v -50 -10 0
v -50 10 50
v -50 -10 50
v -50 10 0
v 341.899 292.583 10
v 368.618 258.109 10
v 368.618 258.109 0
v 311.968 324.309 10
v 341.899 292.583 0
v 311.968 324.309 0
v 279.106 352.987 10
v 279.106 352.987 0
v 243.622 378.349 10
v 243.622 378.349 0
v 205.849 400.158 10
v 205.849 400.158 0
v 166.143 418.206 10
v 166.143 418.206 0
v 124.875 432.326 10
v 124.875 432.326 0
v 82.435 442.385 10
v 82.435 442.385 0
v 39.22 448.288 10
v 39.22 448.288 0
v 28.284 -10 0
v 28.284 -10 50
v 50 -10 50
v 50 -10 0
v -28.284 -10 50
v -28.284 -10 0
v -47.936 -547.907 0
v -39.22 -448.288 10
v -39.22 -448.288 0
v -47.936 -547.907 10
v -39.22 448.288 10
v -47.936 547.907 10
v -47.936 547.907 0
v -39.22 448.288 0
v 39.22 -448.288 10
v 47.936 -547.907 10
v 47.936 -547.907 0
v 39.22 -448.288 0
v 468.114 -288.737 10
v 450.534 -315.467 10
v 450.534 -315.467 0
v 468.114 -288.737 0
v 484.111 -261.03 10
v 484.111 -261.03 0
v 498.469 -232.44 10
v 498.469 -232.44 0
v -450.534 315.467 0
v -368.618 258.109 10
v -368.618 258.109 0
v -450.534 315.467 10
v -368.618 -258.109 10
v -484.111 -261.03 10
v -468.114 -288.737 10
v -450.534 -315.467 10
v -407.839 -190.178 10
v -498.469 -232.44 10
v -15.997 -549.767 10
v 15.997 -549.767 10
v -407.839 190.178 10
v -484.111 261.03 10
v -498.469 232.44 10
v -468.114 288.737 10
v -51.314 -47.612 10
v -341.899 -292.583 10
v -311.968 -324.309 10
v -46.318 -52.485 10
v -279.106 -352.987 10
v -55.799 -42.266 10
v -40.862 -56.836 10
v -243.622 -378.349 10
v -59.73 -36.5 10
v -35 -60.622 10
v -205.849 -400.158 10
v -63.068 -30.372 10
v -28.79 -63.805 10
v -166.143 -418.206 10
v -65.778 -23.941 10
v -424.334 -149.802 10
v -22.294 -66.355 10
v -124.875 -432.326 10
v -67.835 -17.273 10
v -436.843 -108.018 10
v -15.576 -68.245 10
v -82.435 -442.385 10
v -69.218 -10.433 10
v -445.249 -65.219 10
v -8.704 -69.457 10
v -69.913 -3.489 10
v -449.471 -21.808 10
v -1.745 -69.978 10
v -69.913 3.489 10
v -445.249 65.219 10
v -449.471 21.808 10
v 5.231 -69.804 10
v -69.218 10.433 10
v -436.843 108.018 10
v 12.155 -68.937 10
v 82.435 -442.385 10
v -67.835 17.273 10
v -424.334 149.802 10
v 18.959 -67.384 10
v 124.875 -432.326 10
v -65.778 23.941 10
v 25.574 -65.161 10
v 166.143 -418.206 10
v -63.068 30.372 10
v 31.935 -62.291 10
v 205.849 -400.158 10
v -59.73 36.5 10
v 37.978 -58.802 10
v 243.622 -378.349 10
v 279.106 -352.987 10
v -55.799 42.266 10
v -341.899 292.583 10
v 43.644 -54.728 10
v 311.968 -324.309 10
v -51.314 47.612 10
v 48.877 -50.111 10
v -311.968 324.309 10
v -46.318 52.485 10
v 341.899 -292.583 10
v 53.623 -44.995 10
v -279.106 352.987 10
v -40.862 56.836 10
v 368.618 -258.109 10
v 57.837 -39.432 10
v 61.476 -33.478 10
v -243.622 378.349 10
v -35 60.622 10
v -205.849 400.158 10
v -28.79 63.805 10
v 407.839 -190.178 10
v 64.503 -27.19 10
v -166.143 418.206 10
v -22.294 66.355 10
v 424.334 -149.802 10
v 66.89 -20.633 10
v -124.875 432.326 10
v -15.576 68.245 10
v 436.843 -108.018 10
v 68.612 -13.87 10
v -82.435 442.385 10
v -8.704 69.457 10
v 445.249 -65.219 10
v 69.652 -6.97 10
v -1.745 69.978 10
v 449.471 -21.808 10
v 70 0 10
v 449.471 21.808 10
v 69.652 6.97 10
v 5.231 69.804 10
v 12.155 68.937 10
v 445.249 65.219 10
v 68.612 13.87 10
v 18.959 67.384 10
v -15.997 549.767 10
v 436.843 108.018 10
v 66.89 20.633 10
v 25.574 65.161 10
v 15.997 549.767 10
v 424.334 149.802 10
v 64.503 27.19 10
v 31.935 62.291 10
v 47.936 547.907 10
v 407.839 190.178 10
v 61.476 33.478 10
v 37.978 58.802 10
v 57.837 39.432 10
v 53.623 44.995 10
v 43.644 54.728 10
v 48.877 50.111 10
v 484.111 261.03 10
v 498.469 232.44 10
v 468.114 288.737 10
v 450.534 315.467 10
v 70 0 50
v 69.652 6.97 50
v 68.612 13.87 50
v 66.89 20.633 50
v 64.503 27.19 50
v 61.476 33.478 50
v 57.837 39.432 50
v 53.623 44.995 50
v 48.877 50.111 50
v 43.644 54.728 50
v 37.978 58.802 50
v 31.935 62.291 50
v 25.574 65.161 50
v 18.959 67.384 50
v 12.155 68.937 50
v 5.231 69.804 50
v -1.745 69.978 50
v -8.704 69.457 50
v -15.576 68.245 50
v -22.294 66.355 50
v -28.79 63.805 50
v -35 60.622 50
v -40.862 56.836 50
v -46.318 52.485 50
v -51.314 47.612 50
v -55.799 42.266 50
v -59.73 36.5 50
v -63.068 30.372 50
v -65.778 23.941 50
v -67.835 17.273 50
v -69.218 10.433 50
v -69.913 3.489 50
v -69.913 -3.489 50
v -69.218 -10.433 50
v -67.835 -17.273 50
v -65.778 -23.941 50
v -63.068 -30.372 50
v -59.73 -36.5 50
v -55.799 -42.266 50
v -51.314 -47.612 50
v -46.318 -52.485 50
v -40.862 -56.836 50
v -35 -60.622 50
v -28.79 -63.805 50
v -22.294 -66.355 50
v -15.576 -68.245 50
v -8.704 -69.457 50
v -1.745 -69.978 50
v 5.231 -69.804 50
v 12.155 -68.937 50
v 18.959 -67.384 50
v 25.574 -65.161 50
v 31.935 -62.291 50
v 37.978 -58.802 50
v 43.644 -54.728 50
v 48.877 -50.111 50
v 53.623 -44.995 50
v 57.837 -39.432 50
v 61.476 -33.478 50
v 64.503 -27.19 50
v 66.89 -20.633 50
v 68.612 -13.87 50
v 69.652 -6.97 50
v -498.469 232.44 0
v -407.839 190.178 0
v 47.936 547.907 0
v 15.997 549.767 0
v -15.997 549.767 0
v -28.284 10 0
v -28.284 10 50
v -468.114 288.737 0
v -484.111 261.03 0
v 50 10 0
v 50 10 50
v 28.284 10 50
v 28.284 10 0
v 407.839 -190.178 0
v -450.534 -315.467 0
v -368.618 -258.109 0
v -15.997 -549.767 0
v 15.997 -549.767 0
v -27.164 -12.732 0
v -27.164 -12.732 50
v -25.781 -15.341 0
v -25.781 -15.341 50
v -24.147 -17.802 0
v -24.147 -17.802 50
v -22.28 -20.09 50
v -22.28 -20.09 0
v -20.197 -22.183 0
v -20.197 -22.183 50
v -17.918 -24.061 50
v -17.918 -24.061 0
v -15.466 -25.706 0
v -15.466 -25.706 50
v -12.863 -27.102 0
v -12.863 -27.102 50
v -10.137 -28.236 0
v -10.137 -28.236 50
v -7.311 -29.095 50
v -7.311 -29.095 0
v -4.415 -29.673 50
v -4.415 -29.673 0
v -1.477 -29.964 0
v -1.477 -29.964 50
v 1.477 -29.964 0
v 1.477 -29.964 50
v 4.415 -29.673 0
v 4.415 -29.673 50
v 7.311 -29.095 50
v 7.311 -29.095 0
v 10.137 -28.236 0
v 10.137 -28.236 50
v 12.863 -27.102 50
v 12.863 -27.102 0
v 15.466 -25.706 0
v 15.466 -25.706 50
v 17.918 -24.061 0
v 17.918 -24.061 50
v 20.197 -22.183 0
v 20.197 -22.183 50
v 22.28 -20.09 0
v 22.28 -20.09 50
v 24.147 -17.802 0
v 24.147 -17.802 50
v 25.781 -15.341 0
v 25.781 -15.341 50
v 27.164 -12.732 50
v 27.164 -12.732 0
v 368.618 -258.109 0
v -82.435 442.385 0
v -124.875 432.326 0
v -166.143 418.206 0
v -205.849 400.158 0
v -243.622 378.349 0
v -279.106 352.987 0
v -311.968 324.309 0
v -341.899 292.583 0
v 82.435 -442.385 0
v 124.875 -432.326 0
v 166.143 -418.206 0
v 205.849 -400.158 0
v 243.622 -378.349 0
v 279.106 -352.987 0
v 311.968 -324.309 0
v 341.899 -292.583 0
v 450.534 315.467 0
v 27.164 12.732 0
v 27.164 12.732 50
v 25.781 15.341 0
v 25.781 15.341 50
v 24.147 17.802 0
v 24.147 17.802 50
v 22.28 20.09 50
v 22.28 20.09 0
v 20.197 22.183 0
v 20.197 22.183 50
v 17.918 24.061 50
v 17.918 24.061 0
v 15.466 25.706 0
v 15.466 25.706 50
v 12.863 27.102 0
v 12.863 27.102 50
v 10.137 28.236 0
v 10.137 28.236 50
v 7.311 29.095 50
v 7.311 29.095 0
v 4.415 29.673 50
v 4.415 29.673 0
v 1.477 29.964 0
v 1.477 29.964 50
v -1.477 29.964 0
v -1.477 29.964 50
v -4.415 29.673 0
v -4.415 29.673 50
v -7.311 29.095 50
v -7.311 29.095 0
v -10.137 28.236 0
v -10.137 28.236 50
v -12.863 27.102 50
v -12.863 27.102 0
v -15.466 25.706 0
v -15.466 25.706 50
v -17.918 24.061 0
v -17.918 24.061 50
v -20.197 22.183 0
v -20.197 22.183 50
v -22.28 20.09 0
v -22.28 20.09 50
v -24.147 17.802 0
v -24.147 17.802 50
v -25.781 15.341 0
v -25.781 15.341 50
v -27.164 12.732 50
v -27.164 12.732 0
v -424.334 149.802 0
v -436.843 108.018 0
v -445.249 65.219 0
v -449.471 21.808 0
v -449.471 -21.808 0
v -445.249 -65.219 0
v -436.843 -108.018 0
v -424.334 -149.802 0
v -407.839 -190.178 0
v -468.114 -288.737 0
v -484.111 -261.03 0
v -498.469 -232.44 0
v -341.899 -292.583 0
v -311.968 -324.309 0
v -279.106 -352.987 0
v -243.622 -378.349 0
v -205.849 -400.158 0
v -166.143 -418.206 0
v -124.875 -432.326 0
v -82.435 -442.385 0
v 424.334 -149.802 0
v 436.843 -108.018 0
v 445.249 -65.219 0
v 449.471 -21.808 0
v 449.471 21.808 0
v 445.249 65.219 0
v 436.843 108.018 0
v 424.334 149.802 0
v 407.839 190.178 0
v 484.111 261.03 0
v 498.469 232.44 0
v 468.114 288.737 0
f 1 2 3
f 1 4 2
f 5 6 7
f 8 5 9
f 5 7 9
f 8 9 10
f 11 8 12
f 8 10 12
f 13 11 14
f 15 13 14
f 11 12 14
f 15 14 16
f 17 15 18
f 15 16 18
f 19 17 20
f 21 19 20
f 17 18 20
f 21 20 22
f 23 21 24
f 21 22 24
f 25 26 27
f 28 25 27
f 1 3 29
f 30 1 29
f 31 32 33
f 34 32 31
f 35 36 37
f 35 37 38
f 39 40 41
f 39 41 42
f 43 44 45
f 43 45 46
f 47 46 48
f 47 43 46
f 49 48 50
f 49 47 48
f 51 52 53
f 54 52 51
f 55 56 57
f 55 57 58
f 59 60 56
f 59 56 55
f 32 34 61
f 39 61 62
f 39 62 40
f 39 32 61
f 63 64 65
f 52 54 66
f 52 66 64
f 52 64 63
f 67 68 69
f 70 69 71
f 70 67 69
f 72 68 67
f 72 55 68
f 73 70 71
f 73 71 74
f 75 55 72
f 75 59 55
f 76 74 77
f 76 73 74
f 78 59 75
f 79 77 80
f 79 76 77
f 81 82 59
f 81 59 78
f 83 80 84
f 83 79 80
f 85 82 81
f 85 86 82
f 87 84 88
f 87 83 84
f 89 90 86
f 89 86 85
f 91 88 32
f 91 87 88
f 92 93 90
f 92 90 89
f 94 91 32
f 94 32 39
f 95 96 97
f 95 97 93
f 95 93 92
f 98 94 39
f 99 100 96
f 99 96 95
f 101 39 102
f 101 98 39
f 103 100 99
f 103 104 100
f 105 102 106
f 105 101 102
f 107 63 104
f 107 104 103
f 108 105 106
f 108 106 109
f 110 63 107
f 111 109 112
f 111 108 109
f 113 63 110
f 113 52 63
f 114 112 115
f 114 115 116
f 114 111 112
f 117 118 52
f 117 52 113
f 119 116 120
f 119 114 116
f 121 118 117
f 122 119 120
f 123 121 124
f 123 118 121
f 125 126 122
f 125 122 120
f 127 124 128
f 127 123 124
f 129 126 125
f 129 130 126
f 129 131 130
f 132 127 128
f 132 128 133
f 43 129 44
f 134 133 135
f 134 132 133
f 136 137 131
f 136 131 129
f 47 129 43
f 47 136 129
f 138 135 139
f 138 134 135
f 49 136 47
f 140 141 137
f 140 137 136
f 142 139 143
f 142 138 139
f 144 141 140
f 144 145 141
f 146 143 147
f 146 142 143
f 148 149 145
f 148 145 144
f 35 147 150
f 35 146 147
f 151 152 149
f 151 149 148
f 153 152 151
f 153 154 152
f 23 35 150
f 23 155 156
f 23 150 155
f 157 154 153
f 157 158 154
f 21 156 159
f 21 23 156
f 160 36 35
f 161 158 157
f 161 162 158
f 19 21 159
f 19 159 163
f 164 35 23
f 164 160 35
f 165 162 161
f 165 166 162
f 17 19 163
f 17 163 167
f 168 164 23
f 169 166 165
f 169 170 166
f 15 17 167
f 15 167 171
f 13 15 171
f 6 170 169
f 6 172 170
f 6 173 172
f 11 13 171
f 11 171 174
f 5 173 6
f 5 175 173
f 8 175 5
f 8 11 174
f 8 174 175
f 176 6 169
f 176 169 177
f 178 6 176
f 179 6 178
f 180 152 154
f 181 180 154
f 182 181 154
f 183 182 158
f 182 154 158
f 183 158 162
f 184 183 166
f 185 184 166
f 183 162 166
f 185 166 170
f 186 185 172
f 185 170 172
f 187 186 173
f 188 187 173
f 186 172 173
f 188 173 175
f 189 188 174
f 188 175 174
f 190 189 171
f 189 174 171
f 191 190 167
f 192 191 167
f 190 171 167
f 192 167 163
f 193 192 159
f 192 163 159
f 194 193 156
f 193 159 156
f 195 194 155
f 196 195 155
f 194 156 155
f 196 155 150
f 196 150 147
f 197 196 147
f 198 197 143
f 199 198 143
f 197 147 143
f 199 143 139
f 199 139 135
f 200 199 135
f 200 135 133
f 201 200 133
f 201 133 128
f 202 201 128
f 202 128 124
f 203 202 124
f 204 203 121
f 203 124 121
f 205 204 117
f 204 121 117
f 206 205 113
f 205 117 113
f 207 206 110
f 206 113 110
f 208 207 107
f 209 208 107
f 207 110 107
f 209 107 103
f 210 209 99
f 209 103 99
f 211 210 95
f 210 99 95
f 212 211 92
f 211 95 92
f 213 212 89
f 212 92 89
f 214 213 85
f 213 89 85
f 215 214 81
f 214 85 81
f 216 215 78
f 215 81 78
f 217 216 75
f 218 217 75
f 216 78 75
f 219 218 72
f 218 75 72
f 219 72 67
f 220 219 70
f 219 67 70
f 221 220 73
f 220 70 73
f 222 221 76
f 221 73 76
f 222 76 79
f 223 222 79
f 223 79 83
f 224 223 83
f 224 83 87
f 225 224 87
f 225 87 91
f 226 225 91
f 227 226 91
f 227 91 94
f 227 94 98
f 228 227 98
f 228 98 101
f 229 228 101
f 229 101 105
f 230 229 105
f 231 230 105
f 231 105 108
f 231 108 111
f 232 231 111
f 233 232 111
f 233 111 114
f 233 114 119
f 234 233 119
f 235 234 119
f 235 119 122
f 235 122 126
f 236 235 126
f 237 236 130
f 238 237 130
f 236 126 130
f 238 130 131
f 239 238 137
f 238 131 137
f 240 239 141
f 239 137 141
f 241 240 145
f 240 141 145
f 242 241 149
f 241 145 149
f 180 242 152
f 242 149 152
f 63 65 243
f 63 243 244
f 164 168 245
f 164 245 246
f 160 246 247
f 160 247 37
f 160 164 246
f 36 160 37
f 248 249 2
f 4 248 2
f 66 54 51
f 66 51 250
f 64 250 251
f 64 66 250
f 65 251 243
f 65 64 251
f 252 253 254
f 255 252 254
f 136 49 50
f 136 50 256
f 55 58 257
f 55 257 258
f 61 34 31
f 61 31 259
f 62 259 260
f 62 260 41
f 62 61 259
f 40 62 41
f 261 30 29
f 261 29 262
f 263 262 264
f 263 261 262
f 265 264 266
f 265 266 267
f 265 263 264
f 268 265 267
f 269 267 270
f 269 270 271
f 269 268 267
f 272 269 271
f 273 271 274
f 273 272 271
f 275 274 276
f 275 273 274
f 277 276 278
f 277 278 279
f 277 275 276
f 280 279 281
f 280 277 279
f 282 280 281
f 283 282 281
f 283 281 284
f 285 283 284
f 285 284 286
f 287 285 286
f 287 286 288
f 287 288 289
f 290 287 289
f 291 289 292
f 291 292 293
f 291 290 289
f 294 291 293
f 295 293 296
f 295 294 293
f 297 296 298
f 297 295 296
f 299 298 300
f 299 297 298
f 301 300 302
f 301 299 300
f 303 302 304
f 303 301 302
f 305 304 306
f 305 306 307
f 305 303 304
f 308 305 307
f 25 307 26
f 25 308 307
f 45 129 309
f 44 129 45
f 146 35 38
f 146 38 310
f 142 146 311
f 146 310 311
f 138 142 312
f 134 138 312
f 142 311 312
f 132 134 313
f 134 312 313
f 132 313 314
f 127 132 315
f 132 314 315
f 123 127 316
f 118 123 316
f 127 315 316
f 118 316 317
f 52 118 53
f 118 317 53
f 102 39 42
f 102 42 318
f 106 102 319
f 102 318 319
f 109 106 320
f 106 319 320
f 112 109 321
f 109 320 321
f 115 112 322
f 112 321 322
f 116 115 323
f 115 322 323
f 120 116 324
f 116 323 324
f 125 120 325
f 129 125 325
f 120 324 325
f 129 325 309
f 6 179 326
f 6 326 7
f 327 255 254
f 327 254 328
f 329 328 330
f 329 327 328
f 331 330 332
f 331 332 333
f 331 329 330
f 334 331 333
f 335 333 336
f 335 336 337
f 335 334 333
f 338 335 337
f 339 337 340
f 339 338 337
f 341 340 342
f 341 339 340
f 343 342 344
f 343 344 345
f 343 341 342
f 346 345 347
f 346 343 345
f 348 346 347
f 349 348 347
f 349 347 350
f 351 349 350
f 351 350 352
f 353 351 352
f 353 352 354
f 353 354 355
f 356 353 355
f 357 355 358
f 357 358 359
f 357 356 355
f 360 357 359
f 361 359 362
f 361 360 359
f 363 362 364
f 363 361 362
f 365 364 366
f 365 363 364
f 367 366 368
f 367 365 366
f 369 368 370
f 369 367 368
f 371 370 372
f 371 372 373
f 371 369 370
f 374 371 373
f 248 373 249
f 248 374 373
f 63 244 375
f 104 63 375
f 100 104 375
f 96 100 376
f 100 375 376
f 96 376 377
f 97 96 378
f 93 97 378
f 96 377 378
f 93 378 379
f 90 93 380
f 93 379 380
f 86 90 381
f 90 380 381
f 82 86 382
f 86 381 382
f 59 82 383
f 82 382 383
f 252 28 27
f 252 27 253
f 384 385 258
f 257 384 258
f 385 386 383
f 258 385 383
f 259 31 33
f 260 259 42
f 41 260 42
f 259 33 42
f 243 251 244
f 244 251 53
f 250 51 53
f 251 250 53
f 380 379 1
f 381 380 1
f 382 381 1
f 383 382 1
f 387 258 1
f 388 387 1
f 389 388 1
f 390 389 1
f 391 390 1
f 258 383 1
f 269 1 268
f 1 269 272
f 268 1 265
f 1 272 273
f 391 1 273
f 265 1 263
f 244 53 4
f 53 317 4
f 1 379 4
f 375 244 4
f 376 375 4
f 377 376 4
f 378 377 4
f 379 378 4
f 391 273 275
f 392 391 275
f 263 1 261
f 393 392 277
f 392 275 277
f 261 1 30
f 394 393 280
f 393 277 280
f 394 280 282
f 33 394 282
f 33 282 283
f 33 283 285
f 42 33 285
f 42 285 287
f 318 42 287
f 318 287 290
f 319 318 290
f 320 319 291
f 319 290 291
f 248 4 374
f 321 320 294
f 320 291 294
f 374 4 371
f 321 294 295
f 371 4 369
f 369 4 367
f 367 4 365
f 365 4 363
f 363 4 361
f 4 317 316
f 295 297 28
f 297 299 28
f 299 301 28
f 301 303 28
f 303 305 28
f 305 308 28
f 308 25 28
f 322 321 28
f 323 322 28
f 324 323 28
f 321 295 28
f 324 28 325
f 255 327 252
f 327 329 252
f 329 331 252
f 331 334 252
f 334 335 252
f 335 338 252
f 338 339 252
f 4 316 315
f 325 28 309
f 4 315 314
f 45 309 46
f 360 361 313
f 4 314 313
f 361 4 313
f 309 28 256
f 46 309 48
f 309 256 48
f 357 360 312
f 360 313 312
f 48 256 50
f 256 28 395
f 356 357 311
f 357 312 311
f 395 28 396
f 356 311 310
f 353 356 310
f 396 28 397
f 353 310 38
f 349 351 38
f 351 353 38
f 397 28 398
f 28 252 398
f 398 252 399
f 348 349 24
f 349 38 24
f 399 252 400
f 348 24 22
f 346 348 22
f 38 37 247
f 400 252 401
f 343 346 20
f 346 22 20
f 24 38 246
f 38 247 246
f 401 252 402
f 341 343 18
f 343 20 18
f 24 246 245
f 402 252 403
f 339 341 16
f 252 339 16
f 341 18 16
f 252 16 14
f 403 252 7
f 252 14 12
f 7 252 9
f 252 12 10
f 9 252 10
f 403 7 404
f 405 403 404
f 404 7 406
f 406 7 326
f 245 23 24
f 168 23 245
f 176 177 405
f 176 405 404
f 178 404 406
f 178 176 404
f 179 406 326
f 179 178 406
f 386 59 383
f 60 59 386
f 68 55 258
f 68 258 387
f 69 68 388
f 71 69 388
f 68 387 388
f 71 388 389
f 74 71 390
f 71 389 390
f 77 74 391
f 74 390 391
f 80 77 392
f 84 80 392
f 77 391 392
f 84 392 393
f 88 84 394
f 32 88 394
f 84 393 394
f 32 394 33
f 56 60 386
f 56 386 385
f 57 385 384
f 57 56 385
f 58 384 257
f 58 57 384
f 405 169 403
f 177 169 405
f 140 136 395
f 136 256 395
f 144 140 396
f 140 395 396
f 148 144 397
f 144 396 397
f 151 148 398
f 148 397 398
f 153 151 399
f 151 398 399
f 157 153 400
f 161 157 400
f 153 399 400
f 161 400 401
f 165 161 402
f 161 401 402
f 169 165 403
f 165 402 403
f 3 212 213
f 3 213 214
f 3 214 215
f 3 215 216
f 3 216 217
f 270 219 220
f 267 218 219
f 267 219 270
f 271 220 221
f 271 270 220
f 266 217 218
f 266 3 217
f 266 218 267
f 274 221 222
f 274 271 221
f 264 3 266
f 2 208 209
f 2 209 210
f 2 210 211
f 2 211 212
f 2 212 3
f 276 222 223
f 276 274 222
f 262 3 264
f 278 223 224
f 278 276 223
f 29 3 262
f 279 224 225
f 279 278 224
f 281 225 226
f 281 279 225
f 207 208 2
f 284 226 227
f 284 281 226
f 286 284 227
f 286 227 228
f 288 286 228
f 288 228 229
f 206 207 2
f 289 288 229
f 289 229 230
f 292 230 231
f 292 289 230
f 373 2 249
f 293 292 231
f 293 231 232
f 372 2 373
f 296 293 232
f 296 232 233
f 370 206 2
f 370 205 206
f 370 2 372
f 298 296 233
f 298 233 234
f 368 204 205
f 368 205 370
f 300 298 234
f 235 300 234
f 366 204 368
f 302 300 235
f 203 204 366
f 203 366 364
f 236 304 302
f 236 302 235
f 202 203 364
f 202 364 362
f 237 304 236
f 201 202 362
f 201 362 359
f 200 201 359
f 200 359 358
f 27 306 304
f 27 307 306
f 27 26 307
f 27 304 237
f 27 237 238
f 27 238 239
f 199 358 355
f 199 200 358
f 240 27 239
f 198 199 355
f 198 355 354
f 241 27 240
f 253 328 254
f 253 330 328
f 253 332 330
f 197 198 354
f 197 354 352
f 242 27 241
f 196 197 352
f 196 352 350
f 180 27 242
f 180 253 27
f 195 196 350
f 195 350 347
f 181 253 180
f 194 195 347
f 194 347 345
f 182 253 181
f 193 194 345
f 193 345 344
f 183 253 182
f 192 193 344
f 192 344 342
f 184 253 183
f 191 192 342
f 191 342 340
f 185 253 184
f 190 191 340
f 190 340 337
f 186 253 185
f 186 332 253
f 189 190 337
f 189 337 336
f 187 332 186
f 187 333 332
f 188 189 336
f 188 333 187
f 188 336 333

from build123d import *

# Parameters (mm, degrees)
SKETCH1_R           = 450
BOSS_EXTRUDE1_DEPTH = 10
SKETCH2_R           = 70
BOSS_EXTRUDE2_DEPTH = 40
BOSS_EXTRUDE3_DEPTH = 10


with BuildPart() as part:
    # Sketch1 → Boss-Extrude1 (new body)
    with BuildSketch(Plane.XY):
        Circle(SKETCH1_R)
        with BuildLine():
            Line((28.284271247, -10), (50, -10))
            Line((50, -10), (50, 10))
            Line((50, 10), (28.284271247, 10))
            ThreePointArc((28.284271247, 10), (0, 30), (-28.284271247, 10))
            Line((-28.284271247, 10), (-50, 10))
            Line((-50, 10), (-50, -10))
            Line((-50, -10), (-28.284271247, -10))
            ThreePointArc((-28.284271247, -10), (0, -30), (28.284271247, -10))
        make_face(mode=Mode.SUBTRACT)
    extrude(amount=BOSS_EXTRUDE1_DEPTH)

    # Sketch2 → Boss-Extrude2 (add)
    with BuildSketch(Plane.XY.offset(10)):
        Circle(SKETCH2_R)
        with BuildLine():
            Line((-50, 10), (-50, -10))
            Line((-50, -10), (-28.284271247, -10))
            ThreePointArc((-28.284271247, -10), (0, -30), (28.284271247, -10))
            Line((28.284271247, -10), (50, -10))
            Line((50, -10), (50, 10))
            Line((50, 10), (28.284271247, 10))
            ThreePointArc((28.284271247, 10), (0, 30), (-28.284271247, 10))
            Line((-28.284271247, 10), (-50, 10))
        make_face(mode=Mode.SUBTRACT)
    extrude(amount=BOSS_EXTRUDE2_DEPTH)

    # Sketch3 → Boss-Extrude3 (add)
    with BuildSketch(Plane.XY.offset(10)):
        with BuildLine():
            Line((-47.935658511, 547.90708395), (-34.862297099, 398.477879237))
            ThreePointArc((-34.862297099, 398.477879237), (-17.447754946, 399.619288633), (0, 400))
            ThreePointArc((0, 400), (17.447754946, 399.619288633), (34.862297099, 398.477879237))
            Line((34.862297099, 398.477879237), (47.935658511, 547.90708395))
            ThreePointArc((47.935658511, 547.90708395), (0, 550), (-47.935658511, 547.90708395))
        make_face()
        with BuildLine():
            Line((450.533624359, 315.467039993), (327.660817716, 229.43057454))
            ThreePointArc((327.660817716, 229.43057454), (346.410161514, 200), (362.523114815, 169.047304696))
            Line((362.523114815, 169.047304696), (498.46928287, 232.440043957))
            ThreePointArc((498.46928287, 232.440043957), (476.313972081, 275), (450.533624359, 315.467039993))
        make_face()
        with BuildLine():
            Line((498.46928287, -232.440043957), (362.523114815, -169.047304696))
            ThreePointArc((362.523114815, -169.047304696), (346.410161514, -200), (327.660817716, -229.43057454))
            Line((327.660817716, -229.43057454), (450.533624359, -315.467039993))
            ThreePointArc((450.533624359, -315.467039993), (476.313972081, -275), (498.46928287, -232.440043957))
        make_face()
        with BuildLine():
            Line((47.935658511, -547.90708395), (34.862297099, -398.477879237))
            ThreePointArc((34.862297099, -398.477879237), (0, -400), (-34.862297099, -398.477879237))
            Line((-34.862297099, -398.477879237), (-47.935658511, -547.90708395))
            ThreePointArc((-47.935658511, -547.90708395), (0, -550), (47.935658511, -547.90708395))
        make_face()
        with BuildLine():
            Line((-450.533624359, -315.467039993), (-327.660817716, -229.43057454))
            ThreePointArc((-327.660817716, -229.43057454), (-346.410161514, -200), (-362.523114815, -169.047304696))
            Line((-362.523114815, -169.047304696), (-498.46928287, -232.440043957))
            ThreePointArc((-498.46928287, -232.440043957), (-476.313972081, -275), (-450.533624359, -315.467039993))
        make_face()
        with BuildLine():
            Line((-498.46928287, 232.440043957), (-362.523114815, 169.047304696))
            ThreePointArc((-362.523114815, 169.047304696), (-346.410161514, 200), (-327.660817716, 229.43057454))
            Line((-327.660817716, 229.43057454), (-450.533624359, 315.467039993))
            ThreePointArc((-450.533624359, 315.467039993), (-476.313972081, 275), (-498.46928287, 232.440043957))
        make_face()
    extrude(amount=-BOSS_EXTRUDE3_DEPTH)


solid = part.part
